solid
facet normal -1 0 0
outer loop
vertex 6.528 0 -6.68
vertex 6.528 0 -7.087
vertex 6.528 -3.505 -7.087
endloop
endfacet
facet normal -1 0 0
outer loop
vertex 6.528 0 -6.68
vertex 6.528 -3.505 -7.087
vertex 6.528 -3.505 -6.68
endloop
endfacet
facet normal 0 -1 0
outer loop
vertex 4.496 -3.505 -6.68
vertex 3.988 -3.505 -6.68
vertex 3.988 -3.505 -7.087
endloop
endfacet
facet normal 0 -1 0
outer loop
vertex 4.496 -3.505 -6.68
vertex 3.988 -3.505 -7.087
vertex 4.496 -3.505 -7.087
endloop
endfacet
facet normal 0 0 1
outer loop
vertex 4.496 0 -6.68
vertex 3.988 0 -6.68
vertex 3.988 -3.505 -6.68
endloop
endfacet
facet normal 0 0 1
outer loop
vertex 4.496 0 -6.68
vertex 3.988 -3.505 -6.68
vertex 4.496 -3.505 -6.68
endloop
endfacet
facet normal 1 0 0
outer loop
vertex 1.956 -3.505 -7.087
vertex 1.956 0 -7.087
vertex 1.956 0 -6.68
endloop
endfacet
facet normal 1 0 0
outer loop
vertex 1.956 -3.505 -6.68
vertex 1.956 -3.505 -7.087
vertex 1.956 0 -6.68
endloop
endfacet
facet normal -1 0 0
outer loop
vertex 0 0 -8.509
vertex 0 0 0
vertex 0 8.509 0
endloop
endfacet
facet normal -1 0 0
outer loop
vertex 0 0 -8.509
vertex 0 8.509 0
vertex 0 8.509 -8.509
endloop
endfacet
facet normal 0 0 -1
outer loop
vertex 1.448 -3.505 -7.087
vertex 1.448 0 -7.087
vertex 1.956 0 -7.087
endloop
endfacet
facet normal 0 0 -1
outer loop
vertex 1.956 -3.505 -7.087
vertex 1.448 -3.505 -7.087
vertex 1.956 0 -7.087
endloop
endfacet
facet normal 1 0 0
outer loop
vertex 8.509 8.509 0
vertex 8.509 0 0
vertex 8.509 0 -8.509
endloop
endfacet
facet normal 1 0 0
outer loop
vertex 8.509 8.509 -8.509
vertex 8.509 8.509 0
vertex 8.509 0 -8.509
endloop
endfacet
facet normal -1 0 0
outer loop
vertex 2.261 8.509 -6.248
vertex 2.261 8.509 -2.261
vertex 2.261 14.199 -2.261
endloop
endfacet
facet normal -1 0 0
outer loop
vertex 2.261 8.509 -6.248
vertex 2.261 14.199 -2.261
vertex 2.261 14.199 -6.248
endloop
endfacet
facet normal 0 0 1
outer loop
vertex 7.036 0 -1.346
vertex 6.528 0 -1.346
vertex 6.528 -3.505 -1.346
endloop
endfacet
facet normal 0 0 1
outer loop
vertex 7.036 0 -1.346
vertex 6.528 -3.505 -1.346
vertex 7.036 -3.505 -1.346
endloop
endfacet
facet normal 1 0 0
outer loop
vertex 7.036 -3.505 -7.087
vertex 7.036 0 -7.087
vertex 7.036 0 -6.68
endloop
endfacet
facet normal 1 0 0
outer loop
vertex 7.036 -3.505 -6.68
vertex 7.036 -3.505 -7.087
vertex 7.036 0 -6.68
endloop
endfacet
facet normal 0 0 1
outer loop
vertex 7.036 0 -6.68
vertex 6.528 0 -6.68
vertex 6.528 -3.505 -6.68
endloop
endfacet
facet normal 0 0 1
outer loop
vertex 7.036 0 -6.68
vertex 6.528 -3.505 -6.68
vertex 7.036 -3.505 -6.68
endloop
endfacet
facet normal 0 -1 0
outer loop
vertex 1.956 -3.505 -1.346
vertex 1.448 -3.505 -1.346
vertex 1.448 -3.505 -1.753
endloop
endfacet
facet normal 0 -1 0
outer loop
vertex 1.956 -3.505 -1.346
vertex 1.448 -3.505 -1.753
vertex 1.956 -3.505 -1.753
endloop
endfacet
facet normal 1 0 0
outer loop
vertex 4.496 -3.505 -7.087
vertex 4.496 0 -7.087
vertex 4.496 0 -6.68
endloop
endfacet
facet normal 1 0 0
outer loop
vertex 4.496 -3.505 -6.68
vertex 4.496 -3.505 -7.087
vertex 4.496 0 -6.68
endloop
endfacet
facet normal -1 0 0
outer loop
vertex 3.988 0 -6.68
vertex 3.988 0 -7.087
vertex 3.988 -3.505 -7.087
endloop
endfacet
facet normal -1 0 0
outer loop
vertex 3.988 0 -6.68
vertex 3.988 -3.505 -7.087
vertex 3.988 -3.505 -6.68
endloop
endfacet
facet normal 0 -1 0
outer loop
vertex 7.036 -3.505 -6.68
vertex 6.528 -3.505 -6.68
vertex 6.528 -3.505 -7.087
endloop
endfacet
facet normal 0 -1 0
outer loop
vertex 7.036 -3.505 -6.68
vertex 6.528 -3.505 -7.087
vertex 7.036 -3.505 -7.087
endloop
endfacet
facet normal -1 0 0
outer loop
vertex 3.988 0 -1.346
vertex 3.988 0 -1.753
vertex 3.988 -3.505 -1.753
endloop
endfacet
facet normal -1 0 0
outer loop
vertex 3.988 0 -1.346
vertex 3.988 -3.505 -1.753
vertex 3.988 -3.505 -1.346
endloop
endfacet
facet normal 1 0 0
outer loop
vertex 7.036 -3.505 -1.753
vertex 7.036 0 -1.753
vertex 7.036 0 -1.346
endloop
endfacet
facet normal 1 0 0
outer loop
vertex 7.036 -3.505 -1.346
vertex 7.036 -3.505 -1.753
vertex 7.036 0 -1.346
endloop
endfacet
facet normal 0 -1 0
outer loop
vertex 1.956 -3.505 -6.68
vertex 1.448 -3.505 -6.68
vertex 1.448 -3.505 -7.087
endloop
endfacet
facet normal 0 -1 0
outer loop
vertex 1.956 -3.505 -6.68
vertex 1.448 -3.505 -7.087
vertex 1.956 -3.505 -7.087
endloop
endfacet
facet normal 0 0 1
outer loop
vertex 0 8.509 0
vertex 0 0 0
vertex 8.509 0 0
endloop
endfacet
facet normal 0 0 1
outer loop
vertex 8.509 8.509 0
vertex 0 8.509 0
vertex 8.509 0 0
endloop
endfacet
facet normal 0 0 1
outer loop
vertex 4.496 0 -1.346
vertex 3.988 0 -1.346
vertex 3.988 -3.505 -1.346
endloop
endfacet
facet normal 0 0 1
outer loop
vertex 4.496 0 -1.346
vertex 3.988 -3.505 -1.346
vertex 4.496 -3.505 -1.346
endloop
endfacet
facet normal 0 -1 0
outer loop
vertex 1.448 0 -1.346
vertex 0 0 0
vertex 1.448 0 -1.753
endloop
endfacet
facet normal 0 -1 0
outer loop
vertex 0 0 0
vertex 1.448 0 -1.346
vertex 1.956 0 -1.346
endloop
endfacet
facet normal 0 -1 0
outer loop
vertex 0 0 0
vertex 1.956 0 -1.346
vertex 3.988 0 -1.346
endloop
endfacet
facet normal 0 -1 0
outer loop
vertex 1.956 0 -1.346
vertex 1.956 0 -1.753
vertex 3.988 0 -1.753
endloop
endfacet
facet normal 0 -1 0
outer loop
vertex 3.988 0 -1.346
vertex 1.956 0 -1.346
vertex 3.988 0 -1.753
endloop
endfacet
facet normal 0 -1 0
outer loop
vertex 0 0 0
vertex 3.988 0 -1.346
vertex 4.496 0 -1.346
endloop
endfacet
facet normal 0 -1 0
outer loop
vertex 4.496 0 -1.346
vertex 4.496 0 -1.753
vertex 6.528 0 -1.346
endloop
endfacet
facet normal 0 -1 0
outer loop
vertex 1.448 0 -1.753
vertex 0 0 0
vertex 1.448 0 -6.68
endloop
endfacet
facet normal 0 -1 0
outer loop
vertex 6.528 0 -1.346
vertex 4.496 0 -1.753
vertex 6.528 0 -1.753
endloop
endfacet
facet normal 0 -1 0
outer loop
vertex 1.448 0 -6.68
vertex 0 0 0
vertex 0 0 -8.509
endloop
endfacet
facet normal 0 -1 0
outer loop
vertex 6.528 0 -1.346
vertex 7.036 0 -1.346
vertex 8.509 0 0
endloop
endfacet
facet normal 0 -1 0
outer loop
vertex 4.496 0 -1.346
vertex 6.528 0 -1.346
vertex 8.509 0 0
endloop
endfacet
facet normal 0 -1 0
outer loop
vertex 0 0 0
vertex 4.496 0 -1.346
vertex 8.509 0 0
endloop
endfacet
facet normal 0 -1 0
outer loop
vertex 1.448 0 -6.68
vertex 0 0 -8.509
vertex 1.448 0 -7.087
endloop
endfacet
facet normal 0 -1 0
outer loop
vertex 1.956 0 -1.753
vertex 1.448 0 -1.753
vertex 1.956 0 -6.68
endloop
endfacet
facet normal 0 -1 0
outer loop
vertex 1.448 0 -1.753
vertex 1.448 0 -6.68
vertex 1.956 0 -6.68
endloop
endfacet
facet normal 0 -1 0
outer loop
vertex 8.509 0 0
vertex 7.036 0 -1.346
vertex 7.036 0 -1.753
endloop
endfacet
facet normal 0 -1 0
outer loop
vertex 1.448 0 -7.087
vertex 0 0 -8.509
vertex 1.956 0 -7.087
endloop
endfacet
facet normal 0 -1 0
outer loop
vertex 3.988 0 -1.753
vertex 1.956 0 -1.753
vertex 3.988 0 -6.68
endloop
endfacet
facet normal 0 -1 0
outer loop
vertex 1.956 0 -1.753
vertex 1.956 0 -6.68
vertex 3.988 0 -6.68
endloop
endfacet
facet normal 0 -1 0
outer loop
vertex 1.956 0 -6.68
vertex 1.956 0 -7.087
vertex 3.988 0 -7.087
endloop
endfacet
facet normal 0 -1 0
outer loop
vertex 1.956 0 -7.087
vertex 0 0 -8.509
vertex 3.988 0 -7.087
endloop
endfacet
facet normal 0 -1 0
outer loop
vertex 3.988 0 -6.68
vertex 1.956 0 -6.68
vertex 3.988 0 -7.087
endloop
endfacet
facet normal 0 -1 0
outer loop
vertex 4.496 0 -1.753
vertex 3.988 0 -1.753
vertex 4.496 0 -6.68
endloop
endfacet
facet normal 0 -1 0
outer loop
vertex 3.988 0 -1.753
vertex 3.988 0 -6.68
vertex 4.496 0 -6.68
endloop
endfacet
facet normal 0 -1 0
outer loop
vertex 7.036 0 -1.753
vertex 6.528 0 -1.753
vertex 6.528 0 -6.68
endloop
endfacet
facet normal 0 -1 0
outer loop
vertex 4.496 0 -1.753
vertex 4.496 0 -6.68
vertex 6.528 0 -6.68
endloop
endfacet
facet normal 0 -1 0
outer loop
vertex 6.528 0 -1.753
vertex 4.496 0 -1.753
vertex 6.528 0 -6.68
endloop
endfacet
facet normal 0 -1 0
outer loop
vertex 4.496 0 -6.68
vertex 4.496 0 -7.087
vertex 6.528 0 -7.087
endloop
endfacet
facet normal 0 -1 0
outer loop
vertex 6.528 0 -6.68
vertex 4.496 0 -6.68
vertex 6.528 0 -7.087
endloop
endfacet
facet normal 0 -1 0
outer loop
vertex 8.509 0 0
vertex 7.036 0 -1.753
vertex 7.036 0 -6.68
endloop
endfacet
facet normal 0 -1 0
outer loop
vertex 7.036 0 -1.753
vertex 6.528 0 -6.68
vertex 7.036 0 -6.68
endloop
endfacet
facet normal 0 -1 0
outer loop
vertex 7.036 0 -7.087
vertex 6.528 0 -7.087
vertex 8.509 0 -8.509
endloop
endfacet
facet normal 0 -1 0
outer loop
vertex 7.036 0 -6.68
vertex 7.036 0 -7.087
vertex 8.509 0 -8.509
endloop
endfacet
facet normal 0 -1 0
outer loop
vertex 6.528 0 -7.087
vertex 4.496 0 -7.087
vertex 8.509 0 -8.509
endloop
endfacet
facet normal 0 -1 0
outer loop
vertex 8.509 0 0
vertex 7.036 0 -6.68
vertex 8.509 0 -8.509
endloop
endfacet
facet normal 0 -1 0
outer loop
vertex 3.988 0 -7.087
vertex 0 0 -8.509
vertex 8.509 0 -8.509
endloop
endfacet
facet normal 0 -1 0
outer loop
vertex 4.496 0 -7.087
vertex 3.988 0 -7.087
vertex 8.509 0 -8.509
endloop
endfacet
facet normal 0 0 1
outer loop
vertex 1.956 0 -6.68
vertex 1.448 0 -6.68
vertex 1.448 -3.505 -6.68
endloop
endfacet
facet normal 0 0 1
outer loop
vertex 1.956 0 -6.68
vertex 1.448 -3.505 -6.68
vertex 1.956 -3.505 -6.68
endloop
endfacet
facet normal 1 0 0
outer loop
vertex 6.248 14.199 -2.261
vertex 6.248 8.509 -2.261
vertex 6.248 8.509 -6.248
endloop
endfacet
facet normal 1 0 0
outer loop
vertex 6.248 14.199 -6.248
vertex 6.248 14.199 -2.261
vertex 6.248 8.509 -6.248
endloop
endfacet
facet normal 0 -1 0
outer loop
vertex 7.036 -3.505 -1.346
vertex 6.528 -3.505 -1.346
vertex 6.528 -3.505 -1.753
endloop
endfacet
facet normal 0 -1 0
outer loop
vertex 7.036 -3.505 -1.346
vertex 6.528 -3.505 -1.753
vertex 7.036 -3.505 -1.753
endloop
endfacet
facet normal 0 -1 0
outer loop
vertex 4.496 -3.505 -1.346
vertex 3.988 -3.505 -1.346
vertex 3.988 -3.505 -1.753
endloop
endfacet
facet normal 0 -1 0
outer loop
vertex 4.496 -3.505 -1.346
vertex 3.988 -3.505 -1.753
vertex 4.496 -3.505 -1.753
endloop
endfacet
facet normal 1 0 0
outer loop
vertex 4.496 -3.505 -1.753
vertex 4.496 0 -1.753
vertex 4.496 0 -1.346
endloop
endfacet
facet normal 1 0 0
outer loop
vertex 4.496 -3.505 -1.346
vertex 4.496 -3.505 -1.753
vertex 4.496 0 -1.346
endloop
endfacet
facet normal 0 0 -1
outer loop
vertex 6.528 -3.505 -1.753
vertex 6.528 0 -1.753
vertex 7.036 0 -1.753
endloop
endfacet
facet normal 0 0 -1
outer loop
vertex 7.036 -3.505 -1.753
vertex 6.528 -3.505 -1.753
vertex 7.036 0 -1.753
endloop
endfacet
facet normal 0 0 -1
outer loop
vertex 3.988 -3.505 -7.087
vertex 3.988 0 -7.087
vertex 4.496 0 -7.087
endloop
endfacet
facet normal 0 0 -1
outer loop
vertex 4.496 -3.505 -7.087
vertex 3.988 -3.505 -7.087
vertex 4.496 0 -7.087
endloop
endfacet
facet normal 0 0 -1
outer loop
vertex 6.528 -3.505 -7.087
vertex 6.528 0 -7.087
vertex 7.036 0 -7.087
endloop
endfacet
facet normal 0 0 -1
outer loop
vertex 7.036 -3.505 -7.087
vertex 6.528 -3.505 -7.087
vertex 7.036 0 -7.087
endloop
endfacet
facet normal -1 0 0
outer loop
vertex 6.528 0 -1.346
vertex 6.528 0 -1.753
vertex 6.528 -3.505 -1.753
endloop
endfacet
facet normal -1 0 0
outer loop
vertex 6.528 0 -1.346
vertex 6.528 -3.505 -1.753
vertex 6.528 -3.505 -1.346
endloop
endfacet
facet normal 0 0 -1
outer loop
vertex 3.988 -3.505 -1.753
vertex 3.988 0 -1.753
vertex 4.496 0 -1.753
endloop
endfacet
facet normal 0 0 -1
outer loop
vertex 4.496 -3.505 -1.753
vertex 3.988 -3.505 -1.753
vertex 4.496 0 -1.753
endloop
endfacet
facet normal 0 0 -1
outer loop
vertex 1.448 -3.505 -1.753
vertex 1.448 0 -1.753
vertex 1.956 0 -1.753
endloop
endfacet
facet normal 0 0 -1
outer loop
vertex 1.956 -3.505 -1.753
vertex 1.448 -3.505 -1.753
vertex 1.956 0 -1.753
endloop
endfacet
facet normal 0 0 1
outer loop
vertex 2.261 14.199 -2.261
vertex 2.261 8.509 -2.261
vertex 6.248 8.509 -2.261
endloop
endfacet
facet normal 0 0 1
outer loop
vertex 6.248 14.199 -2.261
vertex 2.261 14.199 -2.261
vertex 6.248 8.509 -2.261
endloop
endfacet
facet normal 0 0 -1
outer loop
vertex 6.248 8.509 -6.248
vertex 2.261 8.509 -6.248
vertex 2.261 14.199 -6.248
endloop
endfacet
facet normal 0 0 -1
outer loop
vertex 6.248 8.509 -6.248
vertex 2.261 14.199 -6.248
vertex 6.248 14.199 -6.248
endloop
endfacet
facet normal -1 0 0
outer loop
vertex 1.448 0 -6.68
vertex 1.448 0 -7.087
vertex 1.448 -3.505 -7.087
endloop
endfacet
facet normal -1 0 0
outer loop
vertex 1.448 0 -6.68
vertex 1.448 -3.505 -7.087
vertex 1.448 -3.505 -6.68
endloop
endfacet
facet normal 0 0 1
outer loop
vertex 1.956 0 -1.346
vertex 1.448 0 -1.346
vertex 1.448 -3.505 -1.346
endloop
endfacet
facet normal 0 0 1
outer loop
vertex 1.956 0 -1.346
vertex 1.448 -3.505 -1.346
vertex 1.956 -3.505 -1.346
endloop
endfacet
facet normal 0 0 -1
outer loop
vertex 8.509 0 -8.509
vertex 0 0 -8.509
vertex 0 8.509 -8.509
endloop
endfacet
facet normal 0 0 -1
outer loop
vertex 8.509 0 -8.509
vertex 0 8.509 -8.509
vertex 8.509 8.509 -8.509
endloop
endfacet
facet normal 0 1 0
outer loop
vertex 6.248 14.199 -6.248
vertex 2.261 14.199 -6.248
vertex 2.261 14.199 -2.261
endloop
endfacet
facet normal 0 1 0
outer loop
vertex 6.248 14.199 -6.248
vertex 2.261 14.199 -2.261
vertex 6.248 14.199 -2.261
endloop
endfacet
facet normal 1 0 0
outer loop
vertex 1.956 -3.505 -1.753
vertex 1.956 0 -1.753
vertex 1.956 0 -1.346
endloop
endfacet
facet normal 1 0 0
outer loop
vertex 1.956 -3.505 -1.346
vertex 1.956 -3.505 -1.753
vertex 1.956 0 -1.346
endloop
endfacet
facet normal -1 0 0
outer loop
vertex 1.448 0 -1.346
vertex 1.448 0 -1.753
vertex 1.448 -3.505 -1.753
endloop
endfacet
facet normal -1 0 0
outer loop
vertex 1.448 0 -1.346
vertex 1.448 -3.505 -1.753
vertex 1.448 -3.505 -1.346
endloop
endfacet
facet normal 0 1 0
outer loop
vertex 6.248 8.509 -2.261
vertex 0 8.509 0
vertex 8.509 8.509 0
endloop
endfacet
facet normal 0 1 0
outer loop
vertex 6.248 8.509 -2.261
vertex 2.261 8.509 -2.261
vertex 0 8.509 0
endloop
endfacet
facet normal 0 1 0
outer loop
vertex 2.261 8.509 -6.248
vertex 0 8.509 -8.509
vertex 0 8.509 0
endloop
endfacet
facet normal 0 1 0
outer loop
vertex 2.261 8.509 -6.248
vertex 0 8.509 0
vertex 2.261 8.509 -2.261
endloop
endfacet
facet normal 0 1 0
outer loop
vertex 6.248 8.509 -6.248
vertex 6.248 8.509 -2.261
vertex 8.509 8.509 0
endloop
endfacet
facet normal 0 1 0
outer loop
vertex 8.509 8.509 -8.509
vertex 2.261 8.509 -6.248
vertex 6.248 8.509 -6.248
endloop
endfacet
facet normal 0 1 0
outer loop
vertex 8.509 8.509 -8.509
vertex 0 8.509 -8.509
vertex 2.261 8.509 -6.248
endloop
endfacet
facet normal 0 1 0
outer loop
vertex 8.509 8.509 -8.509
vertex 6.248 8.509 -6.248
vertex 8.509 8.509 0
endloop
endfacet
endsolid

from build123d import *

# Parameters (mm, degrees)
SKETCH1_W           = 8.509
SKETCH1_H           = 8.509
BOSS_EXTRUDE1_DEPTH = 8.509
SKETCH2_W           = 3.9878
SKETCH2_H           = 3.9878
BOSS_EXTRUDE2_DEPTH = 5.6896
SKETCH3_W           = 0.508
SKETCH3_H           = 0.4064
BOSS_EXTRUDE3_DEPTH = 3.5052


with BuildPart() as part:
    # Sketch1 → Boss-Extrude1 (new body)
    with BuildSketch(Plane(origin=(0, 0, 0), x_dir=(1, 0, 0), z_dir=(0, 1, 0))):
        with Locations((4.2545, 4.2545)):
            Rectangle(SKETCH1_W, SKETCH1_H)
    extrude(amount=BOSS_EXTRUDE1_DEPTH)

    # Sketch2 → Boss-Extrude2 (add)
    with BuildSketch(Plane(origin=(0, 8.509, 0), x_dir=(1, 0, 0), z_dir=(0, 1, 0))):
        with Locations((4.2545, 4.2545)):
            Rectangle(SKETCH2_W, SKETCH2_H)
    extrude(amount=BOSS_EXTRUDE2_DEPTH)

    # Sketch3 → Boss-Extrude3 (add)
    with BuildSketch(Plane.XZ):
        with Locations((1.7018, -1.5494)):
            Rectangle(SKETCH3_W, SKETCH3_H)
        with Locations((1.7018, -6.8834)):
            Rectangle(SKETCH3_W, SKETCH3_H)
        with Locations((4.2418, -6.8834)):
            Rectangle(SKETCH3_W, SKETCH3_H)
        with Locations((6.7818, -6.8834)):
            Rectangle(SKETCH3_W, SKETCH3_H)
        with Locations((4.2418, -1.5494)):
            Rectangle(SKETCH3_W, SKETCH3_H)
        with Locations((6.7818, -1.5494)):
            Rectangle(SKETCH3_W, SKETCH3_H)
    extrude(amount=BOSS_EXTRUDE3_DEPTH)


solid = part.part
